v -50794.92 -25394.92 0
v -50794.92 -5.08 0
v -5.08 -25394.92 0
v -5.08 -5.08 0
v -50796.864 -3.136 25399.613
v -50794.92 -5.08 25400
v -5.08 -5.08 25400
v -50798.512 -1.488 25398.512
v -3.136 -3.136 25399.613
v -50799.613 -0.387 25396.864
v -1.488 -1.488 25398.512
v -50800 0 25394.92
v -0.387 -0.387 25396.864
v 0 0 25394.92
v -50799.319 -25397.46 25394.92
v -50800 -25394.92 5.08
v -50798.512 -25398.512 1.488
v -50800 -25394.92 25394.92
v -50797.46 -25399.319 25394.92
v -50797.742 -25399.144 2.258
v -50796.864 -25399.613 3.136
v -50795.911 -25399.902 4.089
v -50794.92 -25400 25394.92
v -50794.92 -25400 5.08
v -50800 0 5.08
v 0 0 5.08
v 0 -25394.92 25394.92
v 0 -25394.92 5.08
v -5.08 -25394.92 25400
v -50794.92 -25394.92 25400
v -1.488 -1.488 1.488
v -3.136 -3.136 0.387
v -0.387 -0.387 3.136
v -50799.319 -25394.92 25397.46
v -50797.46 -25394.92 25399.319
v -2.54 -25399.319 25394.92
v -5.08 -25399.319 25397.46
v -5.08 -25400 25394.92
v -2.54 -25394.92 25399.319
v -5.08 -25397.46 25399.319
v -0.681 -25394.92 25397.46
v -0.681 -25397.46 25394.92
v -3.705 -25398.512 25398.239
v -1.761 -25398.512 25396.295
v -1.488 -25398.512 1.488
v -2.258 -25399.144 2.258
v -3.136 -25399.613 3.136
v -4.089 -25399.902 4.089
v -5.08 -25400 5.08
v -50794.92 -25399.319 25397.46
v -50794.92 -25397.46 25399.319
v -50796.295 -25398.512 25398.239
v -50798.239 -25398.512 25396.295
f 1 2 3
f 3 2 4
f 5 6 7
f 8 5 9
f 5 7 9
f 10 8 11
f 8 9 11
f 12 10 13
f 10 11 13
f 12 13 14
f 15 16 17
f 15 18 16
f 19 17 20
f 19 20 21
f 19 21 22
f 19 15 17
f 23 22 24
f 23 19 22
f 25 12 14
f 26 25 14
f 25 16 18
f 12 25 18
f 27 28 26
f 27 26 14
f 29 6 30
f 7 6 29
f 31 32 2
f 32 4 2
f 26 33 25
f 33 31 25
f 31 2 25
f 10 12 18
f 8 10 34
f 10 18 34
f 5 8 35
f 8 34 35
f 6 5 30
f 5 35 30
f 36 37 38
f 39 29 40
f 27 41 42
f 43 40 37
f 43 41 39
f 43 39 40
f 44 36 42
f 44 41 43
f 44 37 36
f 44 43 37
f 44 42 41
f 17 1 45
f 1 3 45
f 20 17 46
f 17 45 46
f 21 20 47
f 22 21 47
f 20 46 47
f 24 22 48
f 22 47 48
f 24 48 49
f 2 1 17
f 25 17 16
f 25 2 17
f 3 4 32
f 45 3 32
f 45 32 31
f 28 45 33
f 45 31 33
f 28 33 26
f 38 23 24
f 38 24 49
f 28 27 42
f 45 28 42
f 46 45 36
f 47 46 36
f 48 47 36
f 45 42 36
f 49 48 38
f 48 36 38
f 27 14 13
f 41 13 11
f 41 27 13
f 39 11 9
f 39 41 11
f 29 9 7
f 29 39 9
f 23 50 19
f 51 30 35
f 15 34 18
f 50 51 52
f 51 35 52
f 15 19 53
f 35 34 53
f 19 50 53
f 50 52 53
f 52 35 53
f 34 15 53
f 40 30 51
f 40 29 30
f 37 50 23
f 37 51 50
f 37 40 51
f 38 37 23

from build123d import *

# Parameters (mm, degrees)
F0_W        = 50800
F0_H        = 25400
F1_DEPTH    = 25400
F2_R        = 5.08
F3_T1_DEPTH = 25420.32
F3_T3_DEPTH = 50825.4


# Not quite as in the source:
# - a fillet or chamfer that OpenCascade refuses, or shapes differently, is made with other operations: its cross-section is extruded or revolved along the edge and cut away or added


with BuildPart() as f1:
    # F0 (on Front) → F1 (new body)
    with BuildSketch(Plane.XZ):
        with Locations((-25400, 12700)):
            Rectangle(F0_W, F0_H)
    extrude(amount=F1_DEPTH)

    # F2
    f2_edges = [f1.edges().sort_by_distance(p)[0] for p in [
        (0, -12700, 25400),
        (-50800, -12700, 25400),
        (-25400, 0, 25400),
        (-25400, -25400, 25400),
        (-25400, -25400, 0),
        (0, -25400, 12700),
        (-50800, -25400, 12700),
    ]]
    fillet(f2_edges, radius=F2_R)

    # F3: fillet of radius 5.08 on 8 edges, made by hand

    # F3_s2 → F3_t1 (cut)
    with BuildSketch(Plane.XZ.offset(-12.7)):
        with BuildLine():
            ThreePointArc((-50794.92, 0), (-50798.5121024484, 1.4878975516), (-50800, 5.08))
            Line((-50800, 5.08), (-50800, 0))
            Line((-50800, 0), (-50794.92, 0))
        make_face()
        with BuildLine():
            ThreePointArc((-5.08, 0), (-1.4878975516, 1.4878975516), (0, 5.08))
            Line((0, 5.08), (0, 0))
            Line((0, 0), (-5.08, 0))
        make_face()
    extrude(amount=F3_T1_DEPTH, mode=Mode.SUBTRACT)

    # F3_s4 → F3_t3 (cut)
    with BuildSketch(Plane.YZ.offset(-50812.7)):
        with BuildLine():
            ThreePointArc((-5.08, 0), (-1.4878975516, 1.4878975516), (0, 5.08))
            Line((0, 5.08), (0, 0))
            Line((0, 0), (-5.08, 0))
        make_face()
    extrude(amount=F3_T3_DEPTH, mode=Mode.SUBTRACT)


solid = f1.part
